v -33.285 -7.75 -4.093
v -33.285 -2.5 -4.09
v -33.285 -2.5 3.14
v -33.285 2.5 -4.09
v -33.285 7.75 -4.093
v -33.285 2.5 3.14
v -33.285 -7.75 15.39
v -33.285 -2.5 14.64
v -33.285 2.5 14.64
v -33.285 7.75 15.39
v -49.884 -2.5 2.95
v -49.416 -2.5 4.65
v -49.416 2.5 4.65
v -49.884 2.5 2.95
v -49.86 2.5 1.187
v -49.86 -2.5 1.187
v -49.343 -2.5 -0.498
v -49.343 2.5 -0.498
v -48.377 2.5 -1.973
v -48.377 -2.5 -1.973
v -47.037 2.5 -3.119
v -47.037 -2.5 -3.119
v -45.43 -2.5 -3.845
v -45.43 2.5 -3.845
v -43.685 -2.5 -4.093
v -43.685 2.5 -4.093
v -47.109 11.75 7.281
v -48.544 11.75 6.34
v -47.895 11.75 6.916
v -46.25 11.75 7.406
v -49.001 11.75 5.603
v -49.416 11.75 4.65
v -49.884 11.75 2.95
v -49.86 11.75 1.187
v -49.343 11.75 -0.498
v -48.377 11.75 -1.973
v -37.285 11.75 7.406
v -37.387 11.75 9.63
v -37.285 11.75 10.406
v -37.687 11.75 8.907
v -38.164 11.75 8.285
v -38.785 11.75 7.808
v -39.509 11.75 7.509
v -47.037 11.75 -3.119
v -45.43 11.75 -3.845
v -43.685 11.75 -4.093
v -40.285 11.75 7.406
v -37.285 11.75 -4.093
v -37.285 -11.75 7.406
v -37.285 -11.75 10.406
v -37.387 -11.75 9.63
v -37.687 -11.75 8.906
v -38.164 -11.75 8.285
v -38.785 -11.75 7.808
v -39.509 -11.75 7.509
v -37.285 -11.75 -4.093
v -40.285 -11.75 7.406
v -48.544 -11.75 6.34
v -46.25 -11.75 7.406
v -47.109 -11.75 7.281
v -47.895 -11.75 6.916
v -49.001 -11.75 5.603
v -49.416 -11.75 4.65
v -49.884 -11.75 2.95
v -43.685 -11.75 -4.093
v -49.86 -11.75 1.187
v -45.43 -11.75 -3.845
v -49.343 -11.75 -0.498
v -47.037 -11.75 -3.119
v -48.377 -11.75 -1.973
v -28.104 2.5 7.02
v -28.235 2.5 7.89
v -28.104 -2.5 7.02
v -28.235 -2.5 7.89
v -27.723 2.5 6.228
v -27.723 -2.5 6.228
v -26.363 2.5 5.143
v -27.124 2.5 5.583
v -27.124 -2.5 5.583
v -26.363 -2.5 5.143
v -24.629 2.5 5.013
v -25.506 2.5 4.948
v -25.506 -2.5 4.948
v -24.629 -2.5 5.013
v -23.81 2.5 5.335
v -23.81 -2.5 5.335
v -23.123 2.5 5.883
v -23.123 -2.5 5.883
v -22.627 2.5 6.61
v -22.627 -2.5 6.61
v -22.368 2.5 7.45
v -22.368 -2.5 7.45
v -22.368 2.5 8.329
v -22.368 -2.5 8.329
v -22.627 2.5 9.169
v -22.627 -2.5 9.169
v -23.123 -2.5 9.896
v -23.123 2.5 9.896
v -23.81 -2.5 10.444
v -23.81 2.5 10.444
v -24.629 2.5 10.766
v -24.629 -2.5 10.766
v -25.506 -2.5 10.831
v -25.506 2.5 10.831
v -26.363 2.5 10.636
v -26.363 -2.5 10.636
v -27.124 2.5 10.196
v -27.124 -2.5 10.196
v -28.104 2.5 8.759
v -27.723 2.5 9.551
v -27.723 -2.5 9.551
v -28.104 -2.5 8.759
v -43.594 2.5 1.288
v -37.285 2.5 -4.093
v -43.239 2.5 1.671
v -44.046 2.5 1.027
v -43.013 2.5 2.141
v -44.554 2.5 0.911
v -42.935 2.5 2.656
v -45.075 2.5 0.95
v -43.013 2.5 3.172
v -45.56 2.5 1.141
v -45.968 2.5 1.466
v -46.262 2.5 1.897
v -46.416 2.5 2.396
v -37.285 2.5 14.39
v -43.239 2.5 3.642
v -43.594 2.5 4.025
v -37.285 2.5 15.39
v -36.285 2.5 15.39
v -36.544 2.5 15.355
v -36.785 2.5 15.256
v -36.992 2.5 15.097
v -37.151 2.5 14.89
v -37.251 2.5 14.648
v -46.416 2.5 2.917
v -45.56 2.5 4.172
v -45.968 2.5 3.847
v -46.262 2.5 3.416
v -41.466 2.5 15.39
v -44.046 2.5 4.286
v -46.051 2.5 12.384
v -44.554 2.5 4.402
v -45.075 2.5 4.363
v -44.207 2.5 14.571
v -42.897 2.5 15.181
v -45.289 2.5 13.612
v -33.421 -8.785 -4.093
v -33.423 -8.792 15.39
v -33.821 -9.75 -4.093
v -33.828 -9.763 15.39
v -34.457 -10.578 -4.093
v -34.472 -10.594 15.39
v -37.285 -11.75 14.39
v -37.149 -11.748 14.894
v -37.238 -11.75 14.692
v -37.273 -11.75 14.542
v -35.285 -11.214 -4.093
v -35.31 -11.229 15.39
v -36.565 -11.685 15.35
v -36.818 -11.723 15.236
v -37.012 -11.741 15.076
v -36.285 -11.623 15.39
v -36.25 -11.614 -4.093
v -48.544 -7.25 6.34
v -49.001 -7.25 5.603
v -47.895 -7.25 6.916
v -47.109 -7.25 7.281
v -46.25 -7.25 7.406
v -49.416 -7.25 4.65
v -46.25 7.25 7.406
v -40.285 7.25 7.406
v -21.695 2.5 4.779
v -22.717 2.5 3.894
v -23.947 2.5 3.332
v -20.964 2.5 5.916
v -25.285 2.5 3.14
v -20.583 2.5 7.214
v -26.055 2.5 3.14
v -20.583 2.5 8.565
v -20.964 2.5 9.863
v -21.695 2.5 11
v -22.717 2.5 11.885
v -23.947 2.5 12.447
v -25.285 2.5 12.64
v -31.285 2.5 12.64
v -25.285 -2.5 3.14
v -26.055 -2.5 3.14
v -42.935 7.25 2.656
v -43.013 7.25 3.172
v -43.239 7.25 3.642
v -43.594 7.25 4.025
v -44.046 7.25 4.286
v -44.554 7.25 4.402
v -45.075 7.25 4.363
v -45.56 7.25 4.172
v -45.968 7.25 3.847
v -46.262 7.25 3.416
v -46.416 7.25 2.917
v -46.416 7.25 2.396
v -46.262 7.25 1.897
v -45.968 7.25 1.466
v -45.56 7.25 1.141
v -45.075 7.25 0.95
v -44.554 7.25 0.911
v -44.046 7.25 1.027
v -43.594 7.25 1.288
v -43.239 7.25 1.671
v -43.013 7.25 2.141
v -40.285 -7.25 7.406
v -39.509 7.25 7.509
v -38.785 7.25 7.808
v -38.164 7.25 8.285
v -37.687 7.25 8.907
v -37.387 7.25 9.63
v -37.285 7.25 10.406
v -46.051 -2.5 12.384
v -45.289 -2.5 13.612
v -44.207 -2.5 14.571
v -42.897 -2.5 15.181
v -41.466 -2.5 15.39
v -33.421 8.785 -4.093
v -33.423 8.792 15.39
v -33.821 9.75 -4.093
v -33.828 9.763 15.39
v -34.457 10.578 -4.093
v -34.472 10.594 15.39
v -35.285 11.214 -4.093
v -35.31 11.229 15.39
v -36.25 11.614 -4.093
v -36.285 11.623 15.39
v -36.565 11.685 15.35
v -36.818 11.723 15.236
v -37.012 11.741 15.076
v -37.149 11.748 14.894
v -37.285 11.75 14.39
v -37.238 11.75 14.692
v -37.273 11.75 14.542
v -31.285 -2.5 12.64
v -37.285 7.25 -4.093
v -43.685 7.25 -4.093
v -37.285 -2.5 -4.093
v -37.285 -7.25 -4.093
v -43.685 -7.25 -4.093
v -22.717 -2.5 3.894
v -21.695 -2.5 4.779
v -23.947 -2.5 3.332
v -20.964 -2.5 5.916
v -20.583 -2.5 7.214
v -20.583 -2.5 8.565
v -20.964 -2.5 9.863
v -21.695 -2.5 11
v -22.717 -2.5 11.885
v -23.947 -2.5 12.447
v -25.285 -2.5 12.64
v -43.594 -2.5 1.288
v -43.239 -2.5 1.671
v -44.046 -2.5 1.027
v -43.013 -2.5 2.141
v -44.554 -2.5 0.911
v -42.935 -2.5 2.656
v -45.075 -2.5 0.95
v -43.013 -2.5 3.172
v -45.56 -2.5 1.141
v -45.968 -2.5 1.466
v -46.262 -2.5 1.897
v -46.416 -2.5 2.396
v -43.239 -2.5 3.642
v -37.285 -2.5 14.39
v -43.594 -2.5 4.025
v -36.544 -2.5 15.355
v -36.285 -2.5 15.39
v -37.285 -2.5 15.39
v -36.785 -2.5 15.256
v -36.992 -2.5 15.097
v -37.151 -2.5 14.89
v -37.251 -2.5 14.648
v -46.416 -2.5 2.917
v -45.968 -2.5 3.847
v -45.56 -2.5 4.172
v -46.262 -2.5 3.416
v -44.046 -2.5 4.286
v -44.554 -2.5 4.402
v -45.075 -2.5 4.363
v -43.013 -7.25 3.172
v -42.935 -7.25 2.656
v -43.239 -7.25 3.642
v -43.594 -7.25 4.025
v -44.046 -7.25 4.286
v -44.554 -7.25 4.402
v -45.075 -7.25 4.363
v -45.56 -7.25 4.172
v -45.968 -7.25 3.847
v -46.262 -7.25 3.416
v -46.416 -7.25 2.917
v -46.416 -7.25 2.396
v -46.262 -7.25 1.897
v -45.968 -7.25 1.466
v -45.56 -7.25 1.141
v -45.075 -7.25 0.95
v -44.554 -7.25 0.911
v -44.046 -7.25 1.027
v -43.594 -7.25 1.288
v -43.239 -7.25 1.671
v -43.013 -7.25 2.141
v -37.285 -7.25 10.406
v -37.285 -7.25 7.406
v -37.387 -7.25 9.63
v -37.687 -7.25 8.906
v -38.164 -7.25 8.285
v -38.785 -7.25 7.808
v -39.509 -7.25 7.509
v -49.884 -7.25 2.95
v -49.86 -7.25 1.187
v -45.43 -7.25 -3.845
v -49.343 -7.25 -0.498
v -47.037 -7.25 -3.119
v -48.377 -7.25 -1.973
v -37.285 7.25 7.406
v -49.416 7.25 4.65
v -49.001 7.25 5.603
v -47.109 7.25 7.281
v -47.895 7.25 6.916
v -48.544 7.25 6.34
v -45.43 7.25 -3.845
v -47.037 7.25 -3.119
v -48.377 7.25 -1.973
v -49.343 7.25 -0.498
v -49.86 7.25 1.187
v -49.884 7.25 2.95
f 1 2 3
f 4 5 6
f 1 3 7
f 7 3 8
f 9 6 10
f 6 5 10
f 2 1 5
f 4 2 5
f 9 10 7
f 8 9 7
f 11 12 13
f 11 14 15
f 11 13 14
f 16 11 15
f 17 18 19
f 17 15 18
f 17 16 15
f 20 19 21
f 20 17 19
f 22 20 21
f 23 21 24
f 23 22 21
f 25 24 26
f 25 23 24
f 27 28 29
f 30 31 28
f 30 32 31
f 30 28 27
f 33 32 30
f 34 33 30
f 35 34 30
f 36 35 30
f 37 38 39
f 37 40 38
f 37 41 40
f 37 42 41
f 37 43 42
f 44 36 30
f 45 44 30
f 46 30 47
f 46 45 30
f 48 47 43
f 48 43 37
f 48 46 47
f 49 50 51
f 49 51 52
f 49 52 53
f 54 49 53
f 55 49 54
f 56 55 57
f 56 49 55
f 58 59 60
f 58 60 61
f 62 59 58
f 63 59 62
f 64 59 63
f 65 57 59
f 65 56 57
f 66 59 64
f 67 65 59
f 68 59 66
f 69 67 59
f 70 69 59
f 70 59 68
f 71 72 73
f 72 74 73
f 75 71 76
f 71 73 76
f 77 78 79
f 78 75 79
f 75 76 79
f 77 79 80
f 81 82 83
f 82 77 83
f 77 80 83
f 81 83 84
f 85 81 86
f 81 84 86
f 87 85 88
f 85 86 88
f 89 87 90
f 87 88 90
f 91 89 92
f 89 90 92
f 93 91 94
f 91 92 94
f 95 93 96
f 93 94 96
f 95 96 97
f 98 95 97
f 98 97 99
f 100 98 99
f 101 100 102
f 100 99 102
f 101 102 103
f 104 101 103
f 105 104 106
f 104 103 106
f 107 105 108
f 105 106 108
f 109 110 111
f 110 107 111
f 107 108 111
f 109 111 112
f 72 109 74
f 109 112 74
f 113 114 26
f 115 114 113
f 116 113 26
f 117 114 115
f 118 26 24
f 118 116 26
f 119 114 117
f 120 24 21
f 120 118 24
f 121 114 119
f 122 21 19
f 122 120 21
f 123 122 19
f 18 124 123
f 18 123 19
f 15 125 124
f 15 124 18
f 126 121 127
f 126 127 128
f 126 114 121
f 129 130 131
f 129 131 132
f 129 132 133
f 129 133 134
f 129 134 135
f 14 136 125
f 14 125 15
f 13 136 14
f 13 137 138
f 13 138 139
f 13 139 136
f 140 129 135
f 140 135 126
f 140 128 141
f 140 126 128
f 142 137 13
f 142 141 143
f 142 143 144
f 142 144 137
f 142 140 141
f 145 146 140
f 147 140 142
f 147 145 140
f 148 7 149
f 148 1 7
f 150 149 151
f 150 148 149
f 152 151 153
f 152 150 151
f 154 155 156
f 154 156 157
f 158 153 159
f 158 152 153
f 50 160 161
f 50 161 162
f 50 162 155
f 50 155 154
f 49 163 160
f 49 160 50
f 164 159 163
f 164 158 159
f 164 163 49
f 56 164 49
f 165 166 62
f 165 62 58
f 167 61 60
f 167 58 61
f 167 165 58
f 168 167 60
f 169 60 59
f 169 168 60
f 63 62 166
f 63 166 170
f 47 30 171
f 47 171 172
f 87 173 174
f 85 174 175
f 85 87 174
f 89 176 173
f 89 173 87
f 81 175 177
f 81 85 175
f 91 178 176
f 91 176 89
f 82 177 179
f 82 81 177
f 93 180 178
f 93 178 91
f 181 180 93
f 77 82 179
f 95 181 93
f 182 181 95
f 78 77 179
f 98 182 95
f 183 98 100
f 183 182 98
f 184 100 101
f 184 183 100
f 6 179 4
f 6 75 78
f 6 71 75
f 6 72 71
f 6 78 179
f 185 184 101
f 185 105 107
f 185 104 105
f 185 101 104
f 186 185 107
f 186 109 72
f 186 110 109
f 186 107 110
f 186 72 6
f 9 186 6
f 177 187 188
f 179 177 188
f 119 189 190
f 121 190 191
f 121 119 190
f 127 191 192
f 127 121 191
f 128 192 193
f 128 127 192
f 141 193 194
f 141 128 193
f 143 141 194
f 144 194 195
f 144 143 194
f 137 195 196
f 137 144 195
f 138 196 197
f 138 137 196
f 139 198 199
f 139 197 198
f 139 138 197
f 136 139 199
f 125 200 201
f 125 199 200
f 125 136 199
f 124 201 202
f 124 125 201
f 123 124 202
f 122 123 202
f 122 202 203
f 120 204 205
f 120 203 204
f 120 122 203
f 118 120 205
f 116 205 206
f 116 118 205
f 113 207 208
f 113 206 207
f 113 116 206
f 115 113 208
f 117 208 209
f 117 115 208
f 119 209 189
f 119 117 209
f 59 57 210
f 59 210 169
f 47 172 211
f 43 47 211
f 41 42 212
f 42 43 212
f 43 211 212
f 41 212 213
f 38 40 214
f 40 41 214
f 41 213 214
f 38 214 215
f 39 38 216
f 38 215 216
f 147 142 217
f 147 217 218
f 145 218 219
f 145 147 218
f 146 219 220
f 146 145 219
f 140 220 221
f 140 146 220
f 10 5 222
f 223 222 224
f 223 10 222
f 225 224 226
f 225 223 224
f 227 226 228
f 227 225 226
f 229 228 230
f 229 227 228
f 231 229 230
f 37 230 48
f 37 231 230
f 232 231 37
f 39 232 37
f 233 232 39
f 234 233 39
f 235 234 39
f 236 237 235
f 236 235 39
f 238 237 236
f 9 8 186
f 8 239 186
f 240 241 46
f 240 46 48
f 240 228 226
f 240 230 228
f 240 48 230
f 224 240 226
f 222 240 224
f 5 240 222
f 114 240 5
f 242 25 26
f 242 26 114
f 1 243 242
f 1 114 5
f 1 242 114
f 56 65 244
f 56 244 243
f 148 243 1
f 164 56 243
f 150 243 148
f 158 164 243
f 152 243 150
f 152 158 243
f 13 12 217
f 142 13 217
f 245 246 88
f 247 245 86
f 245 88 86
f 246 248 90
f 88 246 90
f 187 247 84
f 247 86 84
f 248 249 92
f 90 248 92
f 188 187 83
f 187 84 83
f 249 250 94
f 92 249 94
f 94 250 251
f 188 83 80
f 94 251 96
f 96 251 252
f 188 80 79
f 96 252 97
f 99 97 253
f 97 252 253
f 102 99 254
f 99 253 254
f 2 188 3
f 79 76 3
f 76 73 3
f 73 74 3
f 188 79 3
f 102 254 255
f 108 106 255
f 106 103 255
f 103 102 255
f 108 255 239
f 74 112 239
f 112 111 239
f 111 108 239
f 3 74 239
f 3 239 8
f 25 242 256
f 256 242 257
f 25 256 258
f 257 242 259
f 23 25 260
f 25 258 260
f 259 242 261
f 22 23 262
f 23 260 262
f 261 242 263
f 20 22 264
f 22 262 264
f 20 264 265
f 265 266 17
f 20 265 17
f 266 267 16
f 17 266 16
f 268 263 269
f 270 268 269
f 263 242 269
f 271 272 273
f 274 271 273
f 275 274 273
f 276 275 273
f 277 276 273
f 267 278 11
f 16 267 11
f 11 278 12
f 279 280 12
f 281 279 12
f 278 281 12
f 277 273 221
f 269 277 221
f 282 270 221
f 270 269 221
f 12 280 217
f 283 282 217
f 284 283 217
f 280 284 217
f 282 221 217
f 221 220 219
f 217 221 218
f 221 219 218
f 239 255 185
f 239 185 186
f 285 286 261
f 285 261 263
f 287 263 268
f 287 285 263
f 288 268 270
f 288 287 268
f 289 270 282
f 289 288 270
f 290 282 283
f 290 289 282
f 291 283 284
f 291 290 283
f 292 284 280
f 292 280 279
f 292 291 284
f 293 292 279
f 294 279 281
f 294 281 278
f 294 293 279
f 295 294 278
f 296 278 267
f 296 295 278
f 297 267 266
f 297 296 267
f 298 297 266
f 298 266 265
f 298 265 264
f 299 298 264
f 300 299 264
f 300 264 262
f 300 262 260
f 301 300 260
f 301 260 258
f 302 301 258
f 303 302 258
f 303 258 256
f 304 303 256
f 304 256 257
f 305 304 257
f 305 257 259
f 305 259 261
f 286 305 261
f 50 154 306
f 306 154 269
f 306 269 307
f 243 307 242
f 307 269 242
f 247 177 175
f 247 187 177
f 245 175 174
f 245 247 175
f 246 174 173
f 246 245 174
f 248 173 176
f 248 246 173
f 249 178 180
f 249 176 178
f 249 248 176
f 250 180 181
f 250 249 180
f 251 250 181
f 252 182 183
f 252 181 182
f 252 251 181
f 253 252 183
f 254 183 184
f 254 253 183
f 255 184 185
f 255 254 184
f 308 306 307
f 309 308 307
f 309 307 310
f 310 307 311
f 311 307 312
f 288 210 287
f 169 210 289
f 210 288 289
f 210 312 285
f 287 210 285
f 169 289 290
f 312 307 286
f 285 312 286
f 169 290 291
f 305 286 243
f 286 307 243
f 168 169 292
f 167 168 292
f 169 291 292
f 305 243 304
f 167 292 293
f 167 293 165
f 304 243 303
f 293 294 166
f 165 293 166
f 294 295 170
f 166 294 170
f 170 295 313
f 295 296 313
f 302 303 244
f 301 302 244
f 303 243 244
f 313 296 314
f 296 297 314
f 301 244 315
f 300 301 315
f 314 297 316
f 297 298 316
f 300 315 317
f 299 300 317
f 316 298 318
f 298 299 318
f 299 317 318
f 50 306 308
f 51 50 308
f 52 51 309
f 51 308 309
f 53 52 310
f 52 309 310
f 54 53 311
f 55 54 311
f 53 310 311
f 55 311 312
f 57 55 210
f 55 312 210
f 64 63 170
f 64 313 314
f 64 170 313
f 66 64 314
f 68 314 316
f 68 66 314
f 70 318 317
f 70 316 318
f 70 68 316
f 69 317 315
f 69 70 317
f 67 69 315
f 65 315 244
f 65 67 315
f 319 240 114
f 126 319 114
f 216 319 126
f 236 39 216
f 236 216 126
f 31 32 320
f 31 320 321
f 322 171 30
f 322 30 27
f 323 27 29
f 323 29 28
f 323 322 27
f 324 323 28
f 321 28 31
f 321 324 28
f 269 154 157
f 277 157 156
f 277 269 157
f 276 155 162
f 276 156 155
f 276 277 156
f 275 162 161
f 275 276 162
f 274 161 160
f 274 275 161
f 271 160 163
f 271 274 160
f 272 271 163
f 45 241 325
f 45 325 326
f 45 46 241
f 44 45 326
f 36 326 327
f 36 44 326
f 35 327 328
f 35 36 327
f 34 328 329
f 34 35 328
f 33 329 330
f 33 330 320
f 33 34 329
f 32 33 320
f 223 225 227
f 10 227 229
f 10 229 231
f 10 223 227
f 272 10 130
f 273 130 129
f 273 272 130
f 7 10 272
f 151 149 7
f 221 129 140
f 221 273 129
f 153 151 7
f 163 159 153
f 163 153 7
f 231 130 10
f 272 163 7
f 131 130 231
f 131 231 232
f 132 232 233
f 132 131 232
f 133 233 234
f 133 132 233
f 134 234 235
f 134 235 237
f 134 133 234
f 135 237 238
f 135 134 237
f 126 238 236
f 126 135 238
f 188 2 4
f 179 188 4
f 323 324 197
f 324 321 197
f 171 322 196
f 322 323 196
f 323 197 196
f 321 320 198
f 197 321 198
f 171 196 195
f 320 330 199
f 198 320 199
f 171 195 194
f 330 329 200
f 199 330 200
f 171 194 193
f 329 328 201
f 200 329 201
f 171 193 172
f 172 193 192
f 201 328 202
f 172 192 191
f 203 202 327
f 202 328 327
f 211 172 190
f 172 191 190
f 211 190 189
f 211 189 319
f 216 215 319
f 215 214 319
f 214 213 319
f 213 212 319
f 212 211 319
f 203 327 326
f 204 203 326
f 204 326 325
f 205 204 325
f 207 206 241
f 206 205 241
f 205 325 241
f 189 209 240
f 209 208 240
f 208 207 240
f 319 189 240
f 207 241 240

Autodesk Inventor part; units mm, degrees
ref_plane "YZ Plane" through (0, 0, 0) normal (1, 0, 0) x (0, 1, 0)
ref_plane "XZ Plane" through (0, 0, 0) normal (0, 1, 0) x (-1, 0, 0)
ref_plane "XY Plane" through (0, 0, 0) normal (0, 0, 1) x (1, 0, 0)
sketch "Sketch2" plane through (0, 0, 0) normal (0, 1, 0) x (-1, 0, 0)
  circle A0 centre (25.2851, 7.8895) radius 2.95
  circle A1 centre (25.2851, 7.8895) radius 4.75
  line L0 (25.2851, 3.1395) -> (33.2851, 3.1395)
  line L1 (25.2851, 12.6395) -> (33.2851, 12.6395)
  line L2 (33.2851, 3.1395) -> (33.2851, -4.0935)
  line L3 (33.2851, -4.0935) -> (43.6851, -4.0935)
  arc A2 (43.6851, -4.0935) -> (49.4162, 4.6499) centre (43.6851, 2.1565) ccw
  line L4 (49.4162, 4.6499) -> (44.7437, 15.3895)
  line L5 (44.7437, 15.3895) -> (33.2851, 15.3895)
  line L6 (33.2851, 15.3895) -> (33.2851, 12.6395)
  point P0 (0, 0)
  dimension "d0" = 5.9
  dimension "d1" = 9.5
  dimension "d2" = 8
  dimension "d4" = 10.4
  dimension "d21" = 11.983
  dimension "d22" = 6.25
extrude "Extrusion1" add sketch "Sketch2" along normal mid plane 5
sketch "Sketch4" plane through (0, 2.5, 0) normal (0, 1, 0) x (1, 0, 0)
  line L0 (-33.2851, -3.1395) -> (-33.2851, 4.0935) projected
  line L1 (-44.7437, -15.3895) -> (-33.2851, -15.3895) projected
  line L2 (-33.2851, 4.0935) -> (-37.2851, 4.0935)
  line L3 (-37.2851, 4.0935) -> (-37.2851, -15.3895)
  line L4 (-37.2851, -15.3895) -> (-33.2851, -15.3895)
  line L5 (-33.2851, -15.3895) -> (-33.2851, 4.0935)
  point P0 (0, 0)
  dimension "d8" = 4
extrude "Extrusion2" add sketch "Sketch4" along normal blind 9.25
sketch "Sketch5" plane through (0, 11.75, 0) normal (0, 1, 0) x (1, 0, 0)
  line L0 (-37.2851, -15.3895) -> (-37.2851, 4.0935) projected
  line L1 (-37.2851, 4.0935) -> (-43.6851, 4.0935) projected
  arc A0 (-43.6851, 4.0935) -> (-49.4162, -4.6499) centre (-43.6851, -2.1565) ccw projected
  line L2 (-49.4162, -4.6499) -> (-44.7437, -15.3895) projected
  line L3 (-44.7437, -15.3895) -> (-37.2851, -15.3895) projected
  point P0 (0, 0)
extrude "Extrusion3" add sketch "Sketch5" against normal blind 4.5
ref_plane "Work Plane1" through (0, 0, 0) normal (0, 1, 0) x (1, 0, 0)
mirror "Mirror1" about plane through (0, 0, 0) normal (0, 1, 0) of "Extrusion2", "Extrusion3"
sketch "Sketch6" plane through (-44.7437, -7.25, 15.3895) normal (0, 1, 0) x (1, 0, 0)
  point P0 (44.7437, 15.3895)
chamfer "Chamfer1" distance 2 angle 45 1 edges at (-33.2851, 0, 12.6395)
fillet "Fillet2" radius 4 2 edges at (-33.2851, 11.75, 5.648) (-33.2851, -11.75, 5.648)
sketch "Sketch7" plane through (-44.7437, -7.25, 15.3895) normal (0, 1, 0) x (1, 0, 0)
  arc A0 (1.0586, 19.483) -> (-4.6725, 10.7396) centre (1.0586, 13.233) ccw projected
  circle A1 centre (0.0586, 12.733) radius 1.75
  circle A2 centre (0.0586, 12.733) radius 6.75
  line L0 (1.0586, 19.483) -> (7.4586, 19.483) projected
  line L1 (1.0586, 19.483) -> (-38.3116, 19.483) construction
  point P0 (44.7437, 15.3895)
  dimension "d18" = 3.5
  dimension "d24" = 13.5
  dimension "d25" = 1
  dimension "d26" = 0.5
extrude "Extrusion4" add sketch "Sketch7" along normal up to surface (14.5 mm away) contours A1
sketch "Sketch8" plane through (0, 11.75, 0) normal (0, 1, 0) x (1, 0, 0)
  line L0 (-54.2603, -7.4065) -> (-37.2851, -7.4065)
  line L1 (-37.2851, -7.4065) -> (-37.2851, -23.5954)
  line L2 (-37.2851, 4.0935) -> (-37.2851, -15.3895) projected
  line L3 (-37.2851, 4.0935) -> (-43.6851, 4.0935) projected
  arc A0 (-43.6851, 4.0935) -> (-49.4162, -4.6499) centre (-43.6851, -2.1565) ccw projected
  line L4 (-49.4162, -4.6499) -> (-44.7437, -15.3895) projected
  line L5 (-44.7437, -15.3895) -> (-37.2851, -15.3895) projected
  point P0 (0, 0)
  point P1 (-48.2169, -7.4065)
  dimension "d28" = 11.5
extrude "Extrusion5" cut sketch "Sketch8" against normal up to surface (4.5 mm away) contours L0 L1 L5 L4
mirror "Mirror2" about plane through (0, 0, 0) normal (0, 1, 0) of "Extrusion5"
fillet "Fillet3" radius 3 2 edges at (-48.2169, 9.5, 7.4065) (-37.2851, 9.5, 7.4065)
fillet "Fillet4" radius 3 2 edges at (-48.2169, -9.5, 7.4065) (-37.2851, -9.5, 7.4065)
fillet "Fillet5" radius 5 1 edges at (-44.7437, 0, 15.3895)
fillet "Fillet6" radius 1 2 edges at (-37.2851, 7.125, 15.3895) (-37.2851, -7.125, 15.3895)
chamfer "Chamfer2" distance 7.23 angle 45 1 edges at (-33.2851, 0, 3.1395)
properties part number "hIP"
